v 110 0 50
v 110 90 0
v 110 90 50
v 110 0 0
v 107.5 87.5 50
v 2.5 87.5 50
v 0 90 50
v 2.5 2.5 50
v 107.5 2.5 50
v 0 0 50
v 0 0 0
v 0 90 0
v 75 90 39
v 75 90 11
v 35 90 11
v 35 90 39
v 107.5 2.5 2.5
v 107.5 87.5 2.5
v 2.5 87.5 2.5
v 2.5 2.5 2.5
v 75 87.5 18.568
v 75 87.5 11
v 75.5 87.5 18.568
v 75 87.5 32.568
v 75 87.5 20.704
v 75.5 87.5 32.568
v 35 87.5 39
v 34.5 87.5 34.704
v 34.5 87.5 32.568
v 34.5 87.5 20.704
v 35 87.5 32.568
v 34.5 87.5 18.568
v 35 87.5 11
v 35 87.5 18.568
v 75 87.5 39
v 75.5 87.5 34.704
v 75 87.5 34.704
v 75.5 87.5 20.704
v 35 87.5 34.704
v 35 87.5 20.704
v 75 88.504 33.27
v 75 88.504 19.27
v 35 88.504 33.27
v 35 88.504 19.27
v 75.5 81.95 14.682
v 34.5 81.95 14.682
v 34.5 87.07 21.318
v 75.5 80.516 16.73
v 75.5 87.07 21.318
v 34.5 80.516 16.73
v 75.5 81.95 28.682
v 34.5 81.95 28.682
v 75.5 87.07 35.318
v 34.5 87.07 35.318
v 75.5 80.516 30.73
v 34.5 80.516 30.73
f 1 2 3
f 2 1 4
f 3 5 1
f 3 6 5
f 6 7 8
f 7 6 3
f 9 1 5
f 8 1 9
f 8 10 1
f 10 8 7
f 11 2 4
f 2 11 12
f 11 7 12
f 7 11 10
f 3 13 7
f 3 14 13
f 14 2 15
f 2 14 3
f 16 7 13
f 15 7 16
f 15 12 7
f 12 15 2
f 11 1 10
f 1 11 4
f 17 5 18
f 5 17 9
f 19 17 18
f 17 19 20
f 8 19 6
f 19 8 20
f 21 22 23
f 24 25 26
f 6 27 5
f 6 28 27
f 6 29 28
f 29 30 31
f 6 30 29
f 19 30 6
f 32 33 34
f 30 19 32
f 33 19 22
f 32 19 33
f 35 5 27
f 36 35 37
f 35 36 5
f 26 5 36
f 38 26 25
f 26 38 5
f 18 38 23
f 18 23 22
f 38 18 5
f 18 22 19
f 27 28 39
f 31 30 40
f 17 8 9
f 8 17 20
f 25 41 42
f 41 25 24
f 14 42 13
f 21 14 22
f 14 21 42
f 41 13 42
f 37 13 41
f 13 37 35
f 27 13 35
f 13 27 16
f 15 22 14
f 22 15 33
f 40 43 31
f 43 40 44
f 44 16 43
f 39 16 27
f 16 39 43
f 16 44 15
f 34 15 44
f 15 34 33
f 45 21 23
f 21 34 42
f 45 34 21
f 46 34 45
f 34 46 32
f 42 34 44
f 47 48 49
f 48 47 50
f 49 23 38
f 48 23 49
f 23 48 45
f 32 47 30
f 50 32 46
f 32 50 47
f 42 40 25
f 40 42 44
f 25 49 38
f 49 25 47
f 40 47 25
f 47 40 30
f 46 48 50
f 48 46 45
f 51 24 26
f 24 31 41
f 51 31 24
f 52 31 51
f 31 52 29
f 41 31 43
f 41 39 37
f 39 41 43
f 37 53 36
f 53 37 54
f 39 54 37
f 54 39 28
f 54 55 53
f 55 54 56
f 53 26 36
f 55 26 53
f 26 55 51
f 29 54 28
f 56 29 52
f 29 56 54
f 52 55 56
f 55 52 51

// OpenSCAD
$fn = 32;

// ----------------------------------------------------------------------
// Vent box: louvers enclosure
// ----------------------------------------------------------------------

// --- parameters (mm) ---
box_l = 110;              // box length, X
box_w = 90;               // box width, Y
box_h = 50;               // box height, Z
wall_t = 2.5;             // shell wall thickness
win_l = 40;               // vent window width, X
win_h = 28;               // vent window height, Z
slat_t = 2.5;             // louver slat thickness
slat_d = 8;               // louver slat depth
slat_a = 35;              // louver slat angle, degrees
slat_pitch = 14;          // louver pitch
slat_yc = 84.51;          // slat centreline Y

win_z0 = (box_h - win_h) / 2;  // window lower edge Z
n_slats = 2;  // louver count
slat_z0 = win_z0 + (win_h - (n_slats - 1) * slat_pitch) / 2;

difference() {
  union() {
    difference() {
      cube([box_l, box_w, box_h]);
  translate([wall_t, wall_t, wall_t])
    cube([box_l - 2 * wall_t, box_w - 2 * wall_t, box_h]);
  translate([(box_l - win_l) / 2, box_w - wall_t - 1, win_z0])
    cube([win_l, wall_t + 2, win_h]);
    }
    for (i = [0 : n_slats - 1])
      translate([box_l / 2, slat_yc, slat_z0 + i * slat_pitch])
        rotate([slat_a, 0, 0])
          cube([win_l + 1, slat_d, slat_t], center = true);
  }
}
